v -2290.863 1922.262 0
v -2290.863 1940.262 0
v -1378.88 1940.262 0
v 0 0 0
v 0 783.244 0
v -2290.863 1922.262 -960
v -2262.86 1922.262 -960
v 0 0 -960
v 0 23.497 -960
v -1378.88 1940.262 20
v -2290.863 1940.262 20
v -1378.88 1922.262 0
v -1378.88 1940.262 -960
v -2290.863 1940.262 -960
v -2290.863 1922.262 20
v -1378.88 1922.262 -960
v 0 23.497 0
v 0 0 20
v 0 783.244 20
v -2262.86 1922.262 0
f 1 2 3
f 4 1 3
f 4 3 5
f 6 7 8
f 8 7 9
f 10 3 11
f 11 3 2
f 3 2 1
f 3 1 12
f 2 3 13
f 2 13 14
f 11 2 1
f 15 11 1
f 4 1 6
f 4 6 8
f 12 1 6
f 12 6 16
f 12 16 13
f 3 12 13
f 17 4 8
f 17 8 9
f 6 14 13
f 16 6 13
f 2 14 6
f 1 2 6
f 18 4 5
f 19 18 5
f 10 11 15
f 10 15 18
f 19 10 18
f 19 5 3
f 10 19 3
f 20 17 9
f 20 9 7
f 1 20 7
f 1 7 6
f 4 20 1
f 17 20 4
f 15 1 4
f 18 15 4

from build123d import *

# Parameters (mm, degrees)
F2_DEPTH = 20
F3_DEPTH = 960
F4_DEPTH = 960


with BuildPart() as f2:
    # F1 (on Top) → F2 (new body)
    with BuildSketch(Plane.XY):
        Polygon((-2262.8597001802, 1922.2620710351), (0, 23.497331208), (0, 783.2443735994), (-1357.4284329475, 1922.2620710351), (-1378.8799976142, 1922.2620710351), align=None)
        Polygon((-2290.8627290637, 1940.2620710351), (-2290.8627290637, 1922.2620710351), (-2262.8597001802, 1922.2620710351), (-1378.8799976142, 1922.2620710351), (-1378.8799976142, 1940.2620710351), align=None)
        Polygon((-2290.8627290637, 1922.2620710351), (0, 0), (0, 23.497331208), (-2262.8597001802, 1922.2620710351), align=None)
        Polygon((-1378.8799976142, 1922.2620710351), (-1357.4284329475, 1922.2620710351), (-1378.8799976142, 1940.2620710351), align=None)
    extrude(amount=F2_DEPTH)


with BuildPart() as f3:
    # F1 (on Top) → F3 (new body)
    with BuildSketch(Plane.XY):
        Polygon((-2290.8627290637, 1940.2620710351), (-2290.8627290637, 1922.2620710351), (-2262.8597001802, 1922.2620710351), (-1378.8799976142, 1922.2620710351), (-1378.8799976142, 1940.2620710351), align=None)
    extrude(amount=-F3_DEPTH)


with BuildPart() as f4:
    # F1 (on Top) → F4 (new body)
    with BuildSketch(Plane.XY):
        Polygon((-2290.8627290637, 1922.2620710351), (0, 0), (0, 23.497331208), (-2262.8597001802, 1922.2620710351), align=None)
    extrude(amount=-F4_DEPTH)


solid = Compound([f2.part, f3.part, f4.part])
